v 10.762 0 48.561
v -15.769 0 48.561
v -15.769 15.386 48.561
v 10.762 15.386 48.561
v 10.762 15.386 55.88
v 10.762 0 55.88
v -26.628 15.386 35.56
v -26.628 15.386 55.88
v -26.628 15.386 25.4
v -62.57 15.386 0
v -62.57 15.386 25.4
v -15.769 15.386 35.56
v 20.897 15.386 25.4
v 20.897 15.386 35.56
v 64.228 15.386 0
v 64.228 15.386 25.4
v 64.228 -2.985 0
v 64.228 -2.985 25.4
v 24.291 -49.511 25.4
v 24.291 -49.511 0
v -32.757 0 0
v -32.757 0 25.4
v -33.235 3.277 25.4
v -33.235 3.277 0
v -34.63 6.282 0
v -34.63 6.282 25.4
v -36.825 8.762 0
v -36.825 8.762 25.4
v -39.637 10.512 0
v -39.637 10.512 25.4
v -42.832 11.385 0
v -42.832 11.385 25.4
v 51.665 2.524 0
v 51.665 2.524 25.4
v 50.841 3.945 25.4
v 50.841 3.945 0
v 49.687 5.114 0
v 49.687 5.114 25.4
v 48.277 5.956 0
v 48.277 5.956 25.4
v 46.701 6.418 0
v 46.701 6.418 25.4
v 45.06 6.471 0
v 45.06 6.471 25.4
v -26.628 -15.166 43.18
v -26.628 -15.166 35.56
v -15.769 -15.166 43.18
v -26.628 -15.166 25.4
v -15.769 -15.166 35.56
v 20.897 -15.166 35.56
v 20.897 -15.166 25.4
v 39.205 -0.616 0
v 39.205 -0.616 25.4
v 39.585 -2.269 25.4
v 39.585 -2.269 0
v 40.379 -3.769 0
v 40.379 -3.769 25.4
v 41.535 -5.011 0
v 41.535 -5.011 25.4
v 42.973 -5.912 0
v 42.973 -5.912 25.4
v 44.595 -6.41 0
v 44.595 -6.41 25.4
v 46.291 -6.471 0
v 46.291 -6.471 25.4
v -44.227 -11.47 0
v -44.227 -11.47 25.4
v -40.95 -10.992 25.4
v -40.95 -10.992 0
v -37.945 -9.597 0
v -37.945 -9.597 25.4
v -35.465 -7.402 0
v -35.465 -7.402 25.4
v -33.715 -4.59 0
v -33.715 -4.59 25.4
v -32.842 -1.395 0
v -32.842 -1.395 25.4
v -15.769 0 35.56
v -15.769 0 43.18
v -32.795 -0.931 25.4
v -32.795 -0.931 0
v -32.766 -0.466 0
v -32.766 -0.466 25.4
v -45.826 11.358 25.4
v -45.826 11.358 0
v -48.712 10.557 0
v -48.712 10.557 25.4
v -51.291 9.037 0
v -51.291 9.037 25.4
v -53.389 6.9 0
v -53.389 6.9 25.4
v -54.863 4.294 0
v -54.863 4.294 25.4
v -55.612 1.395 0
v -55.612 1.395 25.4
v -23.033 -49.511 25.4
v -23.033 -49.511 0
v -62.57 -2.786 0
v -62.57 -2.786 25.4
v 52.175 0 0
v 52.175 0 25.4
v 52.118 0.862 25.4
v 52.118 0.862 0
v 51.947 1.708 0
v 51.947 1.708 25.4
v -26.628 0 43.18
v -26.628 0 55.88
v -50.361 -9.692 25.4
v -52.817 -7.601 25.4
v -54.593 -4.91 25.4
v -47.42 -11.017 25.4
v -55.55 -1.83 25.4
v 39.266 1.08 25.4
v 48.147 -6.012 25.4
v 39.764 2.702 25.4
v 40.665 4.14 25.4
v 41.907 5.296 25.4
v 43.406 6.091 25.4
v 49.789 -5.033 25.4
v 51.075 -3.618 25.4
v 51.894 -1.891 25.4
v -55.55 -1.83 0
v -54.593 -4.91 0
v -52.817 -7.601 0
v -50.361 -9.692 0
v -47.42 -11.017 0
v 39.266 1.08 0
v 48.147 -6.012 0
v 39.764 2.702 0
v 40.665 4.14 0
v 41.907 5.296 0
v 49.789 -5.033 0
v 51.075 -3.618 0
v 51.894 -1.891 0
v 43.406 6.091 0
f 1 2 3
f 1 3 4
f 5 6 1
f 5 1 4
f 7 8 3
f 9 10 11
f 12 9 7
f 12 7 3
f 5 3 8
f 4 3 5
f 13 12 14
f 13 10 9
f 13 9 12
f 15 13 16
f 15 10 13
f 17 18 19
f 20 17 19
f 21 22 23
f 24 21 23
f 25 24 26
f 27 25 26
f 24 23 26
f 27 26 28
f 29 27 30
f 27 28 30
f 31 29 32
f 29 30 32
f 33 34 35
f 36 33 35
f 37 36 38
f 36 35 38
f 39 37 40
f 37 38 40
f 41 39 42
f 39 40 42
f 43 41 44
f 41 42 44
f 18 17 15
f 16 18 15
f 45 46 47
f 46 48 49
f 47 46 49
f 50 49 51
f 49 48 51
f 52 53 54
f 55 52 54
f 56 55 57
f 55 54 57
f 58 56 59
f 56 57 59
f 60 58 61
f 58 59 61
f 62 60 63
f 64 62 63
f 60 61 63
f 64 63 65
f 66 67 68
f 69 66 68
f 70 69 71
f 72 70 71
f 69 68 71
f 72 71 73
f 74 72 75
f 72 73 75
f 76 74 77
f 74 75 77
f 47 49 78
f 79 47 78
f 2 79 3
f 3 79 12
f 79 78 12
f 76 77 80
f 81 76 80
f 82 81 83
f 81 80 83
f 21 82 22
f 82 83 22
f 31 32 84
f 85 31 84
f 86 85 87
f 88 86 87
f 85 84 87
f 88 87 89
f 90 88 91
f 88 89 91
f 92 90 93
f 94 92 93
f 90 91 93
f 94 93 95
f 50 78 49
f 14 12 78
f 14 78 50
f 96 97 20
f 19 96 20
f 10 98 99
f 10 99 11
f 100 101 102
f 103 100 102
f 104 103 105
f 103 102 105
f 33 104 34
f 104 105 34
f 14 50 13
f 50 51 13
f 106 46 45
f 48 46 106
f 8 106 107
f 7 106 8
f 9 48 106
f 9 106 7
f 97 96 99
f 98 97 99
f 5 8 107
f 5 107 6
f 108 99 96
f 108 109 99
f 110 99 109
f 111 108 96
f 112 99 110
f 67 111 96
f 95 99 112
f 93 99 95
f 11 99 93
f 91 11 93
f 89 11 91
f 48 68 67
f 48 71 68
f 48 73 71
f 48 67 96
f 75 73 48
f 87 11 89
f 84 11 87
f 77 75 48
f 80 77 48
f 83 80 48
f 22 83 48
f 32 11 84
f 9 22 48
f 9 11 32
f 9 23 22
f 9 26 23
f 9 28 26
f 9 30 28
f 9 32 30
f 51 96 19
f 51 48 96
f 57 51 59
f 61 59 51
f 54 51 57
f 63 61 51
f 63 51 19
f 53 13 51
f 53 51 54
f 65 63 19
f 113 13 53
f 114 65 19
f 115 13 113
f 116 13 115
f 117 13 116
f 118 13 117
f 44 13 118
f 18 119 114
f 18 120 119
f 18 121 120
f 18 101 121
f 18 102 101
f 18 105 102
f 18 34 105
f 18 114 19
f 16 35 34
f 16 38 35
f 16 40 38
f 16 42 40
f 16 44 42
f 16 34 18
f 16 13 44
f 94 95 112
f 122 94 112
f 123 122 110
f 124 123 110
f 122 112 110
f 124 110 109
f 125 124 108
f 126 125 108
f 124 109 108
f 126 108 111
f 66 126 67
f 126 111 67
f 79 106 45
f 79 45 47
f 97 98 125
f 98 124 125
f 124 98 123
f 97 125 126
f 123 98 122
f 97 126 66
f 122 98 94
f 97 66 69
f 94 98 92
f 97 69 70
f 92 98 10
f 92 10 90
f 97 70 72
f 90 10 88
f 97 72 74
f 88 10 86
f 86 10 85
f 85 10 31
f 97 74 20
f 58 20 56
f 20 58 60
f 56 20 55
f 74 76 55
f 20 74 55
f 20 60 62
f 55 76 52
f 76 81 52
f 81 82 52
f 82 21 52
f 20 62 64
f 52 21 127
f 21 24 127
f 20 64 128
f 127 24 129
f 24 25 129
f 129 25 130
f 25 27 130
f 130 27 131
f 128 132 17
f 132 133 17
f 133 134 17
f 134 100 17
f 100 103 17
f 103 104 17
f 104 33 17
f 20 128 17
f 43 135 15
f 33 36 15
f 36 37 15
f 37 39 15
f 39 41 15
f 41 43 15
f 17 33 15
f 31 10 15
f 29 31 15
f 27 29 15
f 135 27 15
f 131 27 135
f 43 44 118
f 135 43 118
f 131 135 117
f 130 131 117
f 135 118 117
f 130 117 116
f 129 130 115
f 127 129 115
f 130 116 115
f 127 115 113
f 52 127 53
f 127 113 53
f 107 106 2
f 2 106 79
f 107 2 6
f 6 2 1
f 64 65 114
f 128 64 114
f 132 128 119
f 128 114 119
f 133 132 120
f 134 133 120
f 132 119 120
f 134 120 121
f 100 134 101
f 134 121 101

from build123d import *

# Parameters (mm, degrees)
F0_W      = 126.798056066
F0_H      = 64.8966394365
F1_DEPTH  = 25.4
F3_DEPTH  = 25.4
F4_W      = 47.5243106484
F4_H      = 30.5513413623
F5_DEPTH  = 10.16
F6_W      = 47.5243106484
F6_H      = 15.3855457902
F7_DEPTH  = 20.32
F8_W      = 36.6652142256
F8_H      = 13.0012265766
F9_DEPTH  = 25.4
F10_W     = 10.1351421326
F10_H     = 15.3855457902
F11_DEPTH = 15.24
F12_W     = 10.8590964228
F12_H     = 15.1657955721
F13_DEPTH = 7.62
F15_DEPTH = 43.18
F17_DEPTH = 50.8


with BuildPart() as f1:
    # F0 (on Top) → F1 (new body)
    with BuildSketch(Plane.XY):
        with Locations((0.8286423981, -17.062773928)):
            Rectangle(F0_W, F0_H)
    extrude(amount=F1_DEPTH)

    # F2 (on face) → F3 (cut)
    with BuildSketch(Plane.XY.offset(25.4)):
        Polygon((-23.0333544314, -49.5110936463), (-62.5703856349, -2.7855145745), (-62.5703856349, -49.5110936463), align=None)
        Polygon((64.2276704311, -2.9851964209), (24.2912732065, -49.5110936463), (64.2276704311, -49.5110936463), align=None)
    extrude(amount=-F3_DEPTH, mode=Mode.SUBTRACT)

    # F4 (on face) → F5 (join)
    with BuildSketch(Plane.XY.offset(25.4)):
        with Locations((-2.8654746711, 0.109875109)):
            Rectangle(F4_W, F4_H)
    extrude(amount=F5_DEPTH)

    # F6 (on face) → F7 (join)
    with BuildSketch(Plane.XY.offset(35.56)):
        with Locations((-2.8654746711, 7.6927728951)):
            Rectangle(F6_W, F6_H)
    extrude(amount=F7_DEPTH)

    # F8 (on face) → F9 (cut)
    with BuildSketch(Plane.XZ):
        with Locations((2.5640735403, 42.0606132883)):
            Rectangle(F8_W, F8_H)
    extrude(amount=-F9_DEPTH, mode=Mode.SUBTRACT)

    # F10 (on face) → F11 (cut)
    with BuildSketch(Plane.XY.offset(55.88)):
        with Locations((15.8291095868, 7.6927728951)):
            Rectangle(F10_W, F10_H)
    extrude(amount=-F11_DEPTH, mode=Mode.SUBTRACT)

    # F12 (on face) → F13 (join)
    with BuildSketch(Plane.XY.offset(35.56)):
        with Locations((-21.198081784, -7.5828977861)):
            Rectangle(F12_W, F12_H)
    extrude(amount=F13_DEPTH)

    # F14 (on face) → F15 (cut)
    with BuildSketch(Plane.XY.offset(25.4)):
        with BuildLine():
            Line((-55.6119495793, 1.3946691004), (-44.2270040512, 0))
            Line((-44.2270040512, 0), (-42.8323349509, 11.3849455281))
            ThreePointArc((-42.8323349509, 11.3849455281), (-51.2911962592, 9.0365521647), (-55.6119495793, 1.3946691004))
        make_face()
        with BuildLine():
            Line((-44.2270040512, -11.4700517251), (-44.2270040512, 0))
            Line((-44.2270040512, 0), (-55.6119495793, 1.3946691004))
            ThreePointArc((-55.6119495793, 1.3946691004), (-52.8165038416, -7.6014853764), (-44.2270040512, -11.4700517251))
        make_face()
        with BuildLine():
            Line((-32.8420585231, -1.3946691004), (-44.2270040512, 0))
            Line((-44.2270040512, 0), (-44.2270040512, -11.4700517251))
            ThreePointArc((-44.2270040512, -11.4700517251), (-36.6255186748, -8.5894997904), (-32.8420585231, -1.3946691004))
        make_face()
        with BuildLine():
            Line((-42.8323349509, 11.3849455281), (-44.2270040512, 0))
            Line((-44.2270040512, 0), (-32.8420585231, -1.3946691004))
            ThreePointArc((-32.8420585231, -1.3946691004), (-32.7782486457, -0.698631692), (-32.7569523261, 0))
            ThreePointArc((-32.7569523261, 0), (-35.6375042608, 7.6014853764), (-42.8323349509, 11.3849455281))
        make_face()
    extrude(amount=-F15_DEPTH, mode=Mode.SUBTRACT)

    # F16 (on face) → F17 (cut)
    with BuildSketch(Plane.XY.offset(25.4)):
        with BuildLine():
            Line((39.2047164649, -0.6157344434), (45.6754229963, 0))
            Line((45.6754229963, 0), (45.0596885529, 6.4707065314))
            ThreePointArc((45.0596885529, 6.4707065314), (40.6645525286, 4.1400904671), (39.2047164649, -0.6157344434))
        make_face()
        with BuildLine():
            Line((45.0596885529, 6.4707065314), (45.6754229963, 0))
            Line((45.6754229963, 0), (51.6652548153, 2.5241011666))
            ThreePointArc((51.6652548153, 2.5241011666), (49.0092127508, 5.5798761449), (45.0596885529, 6.4707065314))
        make_face()
        with BuildLine():
            Line((51.6652548153, 2.5241011666), (45.6754229963, 0))
            Line((45.6754229963, 0), (46.2911574396, -6.4707065314))
            ThreePointArc((46.2911574396, -6.4707065314), (50.4843421358, -4.3730388324), (52.1753592975, 0))
            ThreePointArc((52.1753592975, 0), (52.0465570083, 1.2875648801), (51.6652548153, 2.5241011666))
        make_face()
        with BuildLine():
            Line((46.2911574396, -6.4707065314), (45.6754229963, 0))
            Line((45.6754229963, 0), (39.2047164649, -0.6157344434))
            ThreePointArc((39.2047164649, -0.6157344434), (41.5353325292, -5.0108704677), (46.2911574396, -6.4707065314))
        make_face()
    extrude(amount=-F17_DEPTH, mode=Mode.SUBTRACT)


solid = f1.part
